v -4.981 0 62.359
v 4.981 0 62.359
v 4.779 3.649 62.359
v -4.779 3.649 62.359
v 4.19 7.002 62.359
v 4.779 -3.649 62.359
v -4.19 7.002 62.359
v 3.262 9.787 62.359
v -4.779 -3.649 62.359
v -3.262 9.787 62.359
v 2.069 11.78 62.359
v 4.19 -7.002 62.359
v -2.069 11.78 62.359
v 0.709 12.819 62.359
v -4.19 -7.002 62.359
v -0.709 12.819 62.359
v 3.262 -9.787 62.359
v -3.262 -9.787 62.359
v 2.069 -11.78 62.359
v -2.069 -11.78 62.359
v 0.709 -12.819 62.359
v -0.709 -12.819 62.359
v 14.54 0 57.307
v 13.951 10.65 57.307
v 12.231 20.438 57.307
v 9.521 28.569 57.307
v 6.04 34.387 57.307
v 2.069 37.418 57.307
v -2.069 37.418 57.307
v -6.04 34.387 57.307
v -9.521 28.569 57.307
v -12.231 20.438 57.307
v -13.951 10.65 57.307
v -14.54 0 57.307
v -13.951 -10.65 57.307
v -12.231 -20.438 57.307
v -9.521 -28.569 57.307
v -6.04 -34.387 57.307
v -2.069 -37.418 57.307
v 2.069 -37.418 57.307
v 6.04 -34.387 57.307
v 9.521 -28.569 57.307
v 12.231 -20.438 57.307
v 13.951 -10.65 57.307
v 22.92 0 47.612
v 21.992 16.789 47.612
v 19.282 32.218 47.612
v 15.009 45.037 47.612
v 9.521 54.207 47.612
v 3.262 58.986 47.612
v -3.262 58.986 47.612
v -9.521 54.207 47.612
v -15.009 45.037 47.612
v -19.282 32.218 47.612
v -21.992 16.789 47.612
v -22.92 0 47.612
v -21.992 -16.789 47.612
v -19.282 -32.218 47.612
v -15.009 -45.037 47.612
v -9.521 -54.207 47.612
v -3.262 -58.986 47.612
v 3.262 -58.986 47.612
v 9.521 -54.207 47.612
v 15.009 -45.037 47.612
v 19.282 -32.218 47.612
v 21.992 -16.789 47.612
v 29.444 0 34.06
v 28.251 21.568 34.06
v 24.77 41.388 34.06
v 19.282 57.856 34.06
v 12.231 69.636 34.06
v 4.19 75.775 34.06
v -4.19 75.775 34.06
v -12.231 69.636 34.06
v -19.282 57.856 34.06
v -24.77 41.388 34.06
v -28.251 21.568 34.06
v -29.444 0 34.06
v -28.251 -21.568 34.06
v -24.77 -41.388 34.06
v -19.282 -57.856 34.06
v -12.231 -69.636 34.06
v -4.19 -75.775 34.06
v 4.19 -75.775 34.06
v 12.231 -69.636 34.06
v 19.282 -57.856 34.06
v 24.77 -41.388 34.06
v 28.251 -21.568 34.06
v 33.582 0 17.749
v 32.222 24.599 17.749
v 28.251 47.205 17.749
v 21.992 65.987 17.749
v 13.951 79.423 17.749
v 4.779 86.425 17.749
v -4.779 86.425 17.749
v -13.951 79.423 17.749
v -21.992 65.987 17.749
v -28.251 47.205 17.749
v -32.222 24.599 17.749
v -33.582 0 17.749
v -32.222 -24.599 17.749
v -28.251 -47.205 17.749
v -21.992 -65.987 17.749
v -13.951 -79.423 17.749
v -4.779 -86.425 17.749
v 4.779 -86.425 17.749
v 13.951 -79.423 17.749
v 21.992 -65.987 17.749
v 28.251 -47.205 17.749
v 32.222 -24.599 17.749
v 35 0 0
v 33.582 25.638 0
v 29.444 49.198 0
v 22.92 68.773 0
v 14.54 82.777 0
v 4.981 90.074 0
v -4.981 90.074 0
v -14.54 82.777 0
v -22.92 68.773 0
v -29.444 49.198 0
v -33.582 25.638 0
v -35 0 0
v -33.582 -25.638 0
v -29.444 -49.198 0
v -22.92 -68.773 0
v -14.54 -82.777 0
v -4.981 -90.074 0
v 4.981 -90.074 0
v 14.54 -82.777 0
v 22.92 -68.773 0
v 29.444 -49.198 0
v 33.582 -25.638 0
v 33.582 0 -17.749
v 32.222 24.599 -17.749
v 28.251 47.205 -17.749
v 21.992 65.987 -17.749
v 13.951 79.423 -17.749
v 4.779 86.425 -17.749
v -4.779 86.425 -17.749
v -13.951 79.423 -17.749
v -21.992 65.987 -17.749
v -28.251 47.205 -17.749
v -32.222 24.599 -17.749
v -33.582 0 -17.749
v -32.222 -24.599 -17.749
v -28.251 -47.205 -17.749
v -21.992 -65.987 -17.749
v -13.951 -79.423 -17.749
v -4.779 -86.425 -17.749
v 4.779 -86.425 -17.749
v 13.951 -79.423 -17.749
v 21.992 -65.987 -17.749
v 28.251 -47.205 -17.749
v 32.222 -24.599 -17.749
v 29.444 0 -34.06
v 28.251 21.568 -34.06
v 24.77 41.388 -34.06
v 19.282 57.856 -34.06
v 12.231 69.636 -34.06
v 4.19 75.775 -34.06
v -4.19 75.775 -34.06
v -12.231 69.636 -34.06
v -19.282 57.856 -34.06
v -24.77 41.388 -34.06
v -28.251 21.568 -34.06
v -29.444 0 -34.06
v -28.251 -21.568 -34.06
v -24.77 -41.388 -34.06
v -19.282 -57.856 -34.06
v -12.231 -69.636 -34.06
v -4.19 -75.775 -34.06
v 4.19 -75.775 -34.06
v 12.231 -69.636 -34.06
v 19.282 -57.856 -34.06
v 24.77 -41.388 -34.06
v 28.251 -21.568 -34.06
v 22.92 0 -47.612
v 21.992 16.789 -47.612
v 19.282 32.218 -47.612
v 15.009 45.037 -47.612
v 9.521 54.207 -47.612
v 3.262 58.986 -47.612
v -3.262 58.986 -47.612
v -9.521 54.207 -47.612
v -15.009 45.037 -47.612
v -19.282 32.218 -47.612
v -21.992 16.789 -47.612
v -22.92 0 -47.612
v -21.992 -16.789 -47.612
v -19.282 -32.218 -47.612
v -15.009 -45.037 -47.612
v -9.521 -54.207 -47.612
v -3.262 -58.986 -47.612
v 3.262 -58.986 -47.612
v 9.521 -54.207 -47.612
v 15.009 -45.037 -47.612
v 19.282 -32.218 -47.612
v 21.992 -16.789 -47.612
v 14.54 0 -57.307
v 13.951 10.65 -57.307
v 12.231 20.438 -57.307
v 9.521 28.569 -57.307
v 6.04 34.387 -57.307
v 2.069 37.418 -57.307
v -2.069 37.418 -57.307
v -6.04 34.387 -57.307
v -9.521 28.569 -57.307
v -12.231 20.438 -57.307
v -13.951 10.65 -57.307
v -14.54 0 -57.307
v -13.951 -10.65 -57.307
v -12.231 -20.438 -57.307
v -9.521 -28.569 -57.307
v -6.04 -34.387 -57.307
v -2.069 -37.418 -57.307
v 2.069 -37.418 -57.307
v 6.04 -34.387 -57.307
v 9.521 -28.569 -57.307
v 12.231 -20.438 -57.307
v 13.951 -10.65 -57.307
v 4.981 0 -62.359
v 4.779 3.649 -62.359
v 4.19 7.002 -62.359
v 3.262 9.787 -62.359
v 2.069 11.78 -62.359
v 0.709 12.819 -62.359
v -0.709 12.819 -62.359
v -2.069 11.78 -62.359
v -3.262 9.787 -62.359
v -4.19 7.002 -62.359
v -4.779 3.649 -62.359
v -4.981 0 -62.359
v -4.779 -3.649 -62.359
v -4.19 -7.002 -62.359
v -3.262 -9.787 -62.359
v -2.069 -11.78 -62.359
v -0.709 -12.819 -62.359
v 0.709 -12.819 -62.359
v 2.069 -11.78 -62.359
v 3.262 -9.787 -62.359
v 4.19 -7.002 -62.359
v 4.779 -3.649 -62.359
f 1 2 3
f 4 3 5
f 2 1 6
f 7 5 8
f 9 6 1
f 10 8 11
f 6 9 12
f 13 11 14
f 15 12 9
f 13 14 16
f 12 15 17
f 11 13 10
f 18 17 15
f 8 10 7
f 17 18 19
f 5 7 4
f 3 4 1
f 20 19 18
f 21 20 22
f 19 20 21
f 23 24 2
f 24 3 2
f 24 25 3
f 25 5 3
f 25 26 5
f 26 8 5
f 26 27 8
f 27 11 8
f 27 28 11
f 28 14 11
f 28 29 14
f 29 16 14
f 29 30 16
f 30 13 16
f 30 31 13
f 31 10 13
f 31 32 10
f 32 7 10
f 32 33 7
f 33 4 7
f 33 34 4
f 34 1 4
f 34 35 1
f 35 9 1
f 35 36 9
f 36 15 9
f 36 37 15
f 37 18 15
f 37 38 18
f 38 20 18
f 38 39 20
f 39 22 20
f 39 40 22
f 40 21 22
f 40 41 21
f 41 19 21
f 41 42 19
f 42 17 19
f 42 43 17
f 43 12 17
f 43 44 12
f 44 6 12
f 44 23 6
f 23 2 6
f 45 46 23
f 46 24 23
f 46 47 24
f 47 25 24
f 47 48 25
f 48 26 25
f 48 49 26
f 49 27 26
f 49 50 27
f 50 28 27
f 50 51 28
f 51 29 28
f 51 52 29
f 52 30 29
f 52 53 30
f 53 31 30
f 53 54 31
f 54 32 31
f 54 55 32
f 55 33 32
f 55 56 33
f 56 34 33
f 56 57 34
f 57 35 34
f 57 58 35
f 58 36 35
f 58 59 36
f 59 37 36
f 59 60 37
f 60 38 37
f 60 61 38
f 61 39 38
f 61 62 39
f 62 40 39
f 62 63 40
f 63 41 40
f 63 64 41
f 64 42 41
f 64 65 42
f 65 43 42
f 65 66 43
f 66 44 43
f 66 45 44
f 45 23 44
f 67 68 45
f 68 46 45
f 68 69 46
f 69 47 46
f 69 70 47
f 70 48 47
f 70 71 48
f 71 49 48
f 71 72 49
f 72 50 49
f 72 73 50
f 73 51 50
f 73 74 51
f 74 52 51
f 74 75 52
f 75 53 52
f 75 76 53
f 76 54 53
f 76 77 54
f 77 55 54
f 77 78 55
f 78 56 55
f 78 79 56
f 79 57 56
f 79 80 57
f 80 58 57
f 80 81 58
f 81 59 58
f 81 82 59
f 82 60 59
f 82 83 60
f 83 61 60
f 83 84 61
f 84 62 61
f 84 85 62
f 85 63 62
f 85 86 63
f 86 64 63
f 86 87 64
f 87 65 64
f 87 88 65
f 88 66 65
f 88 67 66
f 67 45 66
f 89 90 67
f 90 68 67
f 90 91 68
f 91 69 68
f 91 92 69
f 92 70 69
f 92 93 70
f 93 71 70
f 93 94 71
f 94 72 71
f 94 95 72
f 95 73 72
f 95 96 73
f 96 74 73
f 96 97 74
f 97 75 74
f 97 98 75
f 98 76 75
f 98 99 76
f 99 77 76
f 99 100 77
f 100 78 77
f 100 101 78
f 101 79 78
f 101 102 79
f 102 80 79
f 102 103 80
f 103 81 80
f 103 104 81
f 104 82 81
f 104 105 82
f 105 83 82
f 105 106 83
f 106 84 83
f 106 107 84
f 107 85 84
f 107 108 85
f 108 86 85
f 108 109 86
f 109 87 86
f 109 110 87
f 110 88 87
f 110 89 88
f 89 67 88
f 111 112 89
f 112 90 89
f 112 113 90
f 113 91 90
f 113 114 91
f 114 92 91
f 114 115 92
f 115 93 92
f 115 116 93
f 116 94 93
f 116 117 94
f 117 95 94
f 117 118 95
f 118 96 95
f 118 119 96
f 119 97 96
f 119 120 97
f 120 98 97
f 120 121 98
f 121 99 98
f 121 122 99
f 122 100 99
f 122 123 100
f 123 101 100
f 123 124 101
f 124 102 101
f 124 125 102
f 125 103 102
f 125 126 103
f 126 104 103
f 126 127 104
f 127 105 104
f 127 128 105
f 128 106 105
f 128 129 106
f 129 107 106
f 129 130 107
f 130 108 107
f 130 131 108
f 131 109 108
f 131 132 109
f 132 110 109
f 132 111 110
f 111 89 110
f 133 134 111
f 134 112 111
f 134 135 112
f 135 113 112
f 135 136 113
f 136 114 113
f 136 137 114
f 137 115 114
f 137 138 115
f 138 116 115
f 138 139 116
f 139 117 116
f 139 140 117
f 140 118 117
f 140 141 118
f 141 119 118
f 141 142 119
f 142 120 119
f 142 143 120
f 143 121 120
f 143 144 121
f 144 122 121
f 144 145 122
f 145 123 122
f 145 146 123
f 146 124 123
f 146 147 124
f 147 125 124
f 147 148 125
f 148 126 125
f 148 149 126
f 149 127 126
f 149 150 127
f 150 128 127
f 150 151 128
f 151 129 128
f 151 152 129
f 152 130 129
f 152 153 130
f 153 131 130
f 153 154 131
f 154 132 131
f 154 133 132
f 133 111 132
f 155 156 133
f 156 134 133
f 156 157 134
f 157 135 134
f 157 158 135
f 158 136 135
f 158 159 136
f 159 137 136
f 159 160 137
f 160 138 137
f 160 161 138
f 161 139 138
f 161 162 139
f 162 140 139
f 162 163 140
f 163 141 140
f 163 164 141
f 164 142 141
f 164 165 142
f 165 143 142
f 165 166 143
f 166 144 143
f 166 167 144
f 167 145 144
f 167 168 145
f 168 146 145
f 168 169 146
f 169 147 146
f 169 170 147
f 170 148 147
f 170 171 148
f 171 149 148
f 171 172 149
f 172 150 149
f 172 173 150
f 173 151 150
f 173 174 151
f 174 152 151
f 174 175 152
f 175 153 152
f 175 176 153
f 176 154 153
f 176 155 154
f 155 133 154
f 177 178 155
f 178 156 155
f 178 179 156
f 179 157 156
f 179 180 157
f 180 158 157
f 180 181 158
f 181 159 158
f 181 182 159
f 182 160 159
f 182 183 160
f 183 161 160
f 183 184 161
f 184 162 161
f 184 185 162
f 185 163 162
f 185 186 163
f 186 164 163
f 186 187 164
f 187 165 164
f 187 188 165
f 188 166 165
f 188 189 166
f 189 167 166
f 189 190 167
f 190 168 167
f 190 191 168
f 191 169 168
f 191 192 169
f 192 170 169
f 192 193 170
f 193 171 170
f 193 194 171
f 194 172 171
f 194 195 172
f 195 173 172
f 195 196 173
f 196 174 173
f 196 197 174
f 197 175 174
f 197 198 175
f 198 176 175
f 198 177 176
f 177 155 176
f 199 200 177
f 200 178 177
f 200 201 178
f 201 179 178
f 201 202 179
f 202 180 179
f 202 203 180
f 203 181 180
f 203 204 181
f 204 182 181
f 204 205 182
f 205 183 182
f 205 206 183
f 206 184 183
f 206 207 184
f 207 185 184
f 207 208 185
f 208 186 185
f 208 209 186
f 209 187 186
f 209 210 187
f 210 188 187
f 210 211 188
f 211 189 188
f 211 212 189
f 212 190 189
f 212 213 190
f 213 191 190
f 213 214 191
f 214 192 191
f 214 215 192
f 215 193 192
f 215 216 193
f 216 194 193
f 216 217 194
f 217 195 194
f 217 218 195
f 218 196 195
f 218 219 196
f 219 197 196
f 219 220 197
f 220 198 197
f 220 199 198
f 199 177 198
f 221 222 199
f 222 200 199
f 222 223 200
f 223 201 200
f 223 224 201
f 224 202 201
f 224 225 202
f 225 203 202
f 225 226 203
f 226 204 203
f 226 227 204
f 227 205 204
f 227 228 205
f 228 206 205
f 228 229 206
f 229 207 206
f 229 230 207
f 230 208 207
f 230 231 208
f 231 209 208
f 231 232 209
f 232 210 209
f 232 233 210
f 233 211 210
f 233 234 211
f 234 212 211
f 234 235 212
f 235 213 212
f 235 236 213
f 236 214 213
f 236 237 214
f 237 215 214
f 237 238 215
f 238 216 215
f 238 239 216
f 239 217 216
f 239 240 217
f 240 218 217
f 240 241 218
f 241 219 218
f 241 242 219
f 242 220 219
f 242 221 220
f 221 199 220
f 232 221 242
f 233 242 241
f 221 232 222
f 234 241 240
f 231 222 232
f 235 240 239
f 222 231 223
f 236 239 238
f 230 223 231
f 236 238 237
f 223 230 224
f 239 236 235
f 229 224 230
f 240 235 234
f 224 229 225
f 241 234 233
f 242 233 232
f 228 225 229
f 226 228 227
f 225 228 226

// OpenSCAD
// Generated by SolidPython 1.0.1 on 2020-07-29 00:46:46


scale(v = [5, 13, 9]) {
	sphere(r = 7);
}
/***********************************************
*********      SolidPython code:      **********
************************************************
 
# import packages: SolidPython
from solid import *
from solid.utils import *
from itertools import chain, combinations, permutations


class Resize:

    def __init__(self, scad_file):
        self.scad_file = scad_file
        #self.scad_file = import_scad(scad_file)
        # cone/cylinder param:
        self.r1 = 0
        self.r2 = 0
        self.h = 0
        # rectangular prism param:
        self.w = 0
        self.l = 0
        # ellipse param:
        self.r = 0

    # import OpenScad code (file name corresponds to shape)


    # classify shape + parameters
    def assign(self, param1, param2, param3):
        if self.scad_file == 'cone.scad':
            self.r1 = param1
            self.r2 = param2
            self.h = param3
        elif self.scad_file == 'cylinder.scad':
            self.r1 = param1
            self.r2 = param2
            self.h = param3
        elif self.scad_file == 'rectangularPrism.scad':
            self.h = param1
            self.l = param2
            self.w = param3
        else:
            self.r = param1
            self.h = param2

    # resize parameters
    def iterate(self):
        x = range(3, 20, 2)
        i = 1
        if self.scad_file == 'cone.scad':
            tempList = list(permutations(x, 2))
            for temp in tempList:
                param1 = temp[0]
                param2 = temp[1]
                filepath = 'produced_scad_files/' + 'cone' + str(param1) + '_' + str(param2) + '_' + '.scad'
                scad_render_to_file(cylinder(h=param1, r1=param2, r2=0), filepath)

        elif self.scad_file == 'cylinder.scad':
            tempList = list(permutations(x, 3))
            for temp in tempList:
                param1 = temp[0]
                param2 = temp[1]
                filepath = 'produced_scad_files/' + 'cylinder' + str(param1) + '_' + str(param2) + '_' + '.scad'
                scad_render_to_file(cylinder(h=param1, r1=param2, r2=param2), filepath)

        elif self.scad_file == 'rectangularPrism.scad':
            tempList = list(permutations(x, 3))
            for temp in tempList:
                param1 = temp[0]
                param2 = temp[1]
                param3 = temp[2]
                filepath = 'produced_scad_files/' + 'rectangularPrism' + str(param1) + '_' + str(param2) + '_' + str(
                    param3) + '.scad'
                scad_render_to_file(cube(size=(param1, param2, param3)), filepath)

        elif self.scad_file == 'ellipse.scad':
            tempList = list(permutations(x, 4))
            for temp in tempList:
                param1 = temp[0]
                param2 = temp[1]
                param3 = temp[2]
                param4 = temp[3]
                filepath = 'produced_scad_files/' + 'ellipse' + str(param1) + '_' + str(param2) + '_' + str(param3) + '_' + str(param4) + '.scad'
                scad_render_to_file(scale([param1, param2, param3])(sphere(r=param4)), filepath)

    def render_to_scadfile(self):
        scad_render_to_file(scad, 'example.scad') 
 
************************************************/
